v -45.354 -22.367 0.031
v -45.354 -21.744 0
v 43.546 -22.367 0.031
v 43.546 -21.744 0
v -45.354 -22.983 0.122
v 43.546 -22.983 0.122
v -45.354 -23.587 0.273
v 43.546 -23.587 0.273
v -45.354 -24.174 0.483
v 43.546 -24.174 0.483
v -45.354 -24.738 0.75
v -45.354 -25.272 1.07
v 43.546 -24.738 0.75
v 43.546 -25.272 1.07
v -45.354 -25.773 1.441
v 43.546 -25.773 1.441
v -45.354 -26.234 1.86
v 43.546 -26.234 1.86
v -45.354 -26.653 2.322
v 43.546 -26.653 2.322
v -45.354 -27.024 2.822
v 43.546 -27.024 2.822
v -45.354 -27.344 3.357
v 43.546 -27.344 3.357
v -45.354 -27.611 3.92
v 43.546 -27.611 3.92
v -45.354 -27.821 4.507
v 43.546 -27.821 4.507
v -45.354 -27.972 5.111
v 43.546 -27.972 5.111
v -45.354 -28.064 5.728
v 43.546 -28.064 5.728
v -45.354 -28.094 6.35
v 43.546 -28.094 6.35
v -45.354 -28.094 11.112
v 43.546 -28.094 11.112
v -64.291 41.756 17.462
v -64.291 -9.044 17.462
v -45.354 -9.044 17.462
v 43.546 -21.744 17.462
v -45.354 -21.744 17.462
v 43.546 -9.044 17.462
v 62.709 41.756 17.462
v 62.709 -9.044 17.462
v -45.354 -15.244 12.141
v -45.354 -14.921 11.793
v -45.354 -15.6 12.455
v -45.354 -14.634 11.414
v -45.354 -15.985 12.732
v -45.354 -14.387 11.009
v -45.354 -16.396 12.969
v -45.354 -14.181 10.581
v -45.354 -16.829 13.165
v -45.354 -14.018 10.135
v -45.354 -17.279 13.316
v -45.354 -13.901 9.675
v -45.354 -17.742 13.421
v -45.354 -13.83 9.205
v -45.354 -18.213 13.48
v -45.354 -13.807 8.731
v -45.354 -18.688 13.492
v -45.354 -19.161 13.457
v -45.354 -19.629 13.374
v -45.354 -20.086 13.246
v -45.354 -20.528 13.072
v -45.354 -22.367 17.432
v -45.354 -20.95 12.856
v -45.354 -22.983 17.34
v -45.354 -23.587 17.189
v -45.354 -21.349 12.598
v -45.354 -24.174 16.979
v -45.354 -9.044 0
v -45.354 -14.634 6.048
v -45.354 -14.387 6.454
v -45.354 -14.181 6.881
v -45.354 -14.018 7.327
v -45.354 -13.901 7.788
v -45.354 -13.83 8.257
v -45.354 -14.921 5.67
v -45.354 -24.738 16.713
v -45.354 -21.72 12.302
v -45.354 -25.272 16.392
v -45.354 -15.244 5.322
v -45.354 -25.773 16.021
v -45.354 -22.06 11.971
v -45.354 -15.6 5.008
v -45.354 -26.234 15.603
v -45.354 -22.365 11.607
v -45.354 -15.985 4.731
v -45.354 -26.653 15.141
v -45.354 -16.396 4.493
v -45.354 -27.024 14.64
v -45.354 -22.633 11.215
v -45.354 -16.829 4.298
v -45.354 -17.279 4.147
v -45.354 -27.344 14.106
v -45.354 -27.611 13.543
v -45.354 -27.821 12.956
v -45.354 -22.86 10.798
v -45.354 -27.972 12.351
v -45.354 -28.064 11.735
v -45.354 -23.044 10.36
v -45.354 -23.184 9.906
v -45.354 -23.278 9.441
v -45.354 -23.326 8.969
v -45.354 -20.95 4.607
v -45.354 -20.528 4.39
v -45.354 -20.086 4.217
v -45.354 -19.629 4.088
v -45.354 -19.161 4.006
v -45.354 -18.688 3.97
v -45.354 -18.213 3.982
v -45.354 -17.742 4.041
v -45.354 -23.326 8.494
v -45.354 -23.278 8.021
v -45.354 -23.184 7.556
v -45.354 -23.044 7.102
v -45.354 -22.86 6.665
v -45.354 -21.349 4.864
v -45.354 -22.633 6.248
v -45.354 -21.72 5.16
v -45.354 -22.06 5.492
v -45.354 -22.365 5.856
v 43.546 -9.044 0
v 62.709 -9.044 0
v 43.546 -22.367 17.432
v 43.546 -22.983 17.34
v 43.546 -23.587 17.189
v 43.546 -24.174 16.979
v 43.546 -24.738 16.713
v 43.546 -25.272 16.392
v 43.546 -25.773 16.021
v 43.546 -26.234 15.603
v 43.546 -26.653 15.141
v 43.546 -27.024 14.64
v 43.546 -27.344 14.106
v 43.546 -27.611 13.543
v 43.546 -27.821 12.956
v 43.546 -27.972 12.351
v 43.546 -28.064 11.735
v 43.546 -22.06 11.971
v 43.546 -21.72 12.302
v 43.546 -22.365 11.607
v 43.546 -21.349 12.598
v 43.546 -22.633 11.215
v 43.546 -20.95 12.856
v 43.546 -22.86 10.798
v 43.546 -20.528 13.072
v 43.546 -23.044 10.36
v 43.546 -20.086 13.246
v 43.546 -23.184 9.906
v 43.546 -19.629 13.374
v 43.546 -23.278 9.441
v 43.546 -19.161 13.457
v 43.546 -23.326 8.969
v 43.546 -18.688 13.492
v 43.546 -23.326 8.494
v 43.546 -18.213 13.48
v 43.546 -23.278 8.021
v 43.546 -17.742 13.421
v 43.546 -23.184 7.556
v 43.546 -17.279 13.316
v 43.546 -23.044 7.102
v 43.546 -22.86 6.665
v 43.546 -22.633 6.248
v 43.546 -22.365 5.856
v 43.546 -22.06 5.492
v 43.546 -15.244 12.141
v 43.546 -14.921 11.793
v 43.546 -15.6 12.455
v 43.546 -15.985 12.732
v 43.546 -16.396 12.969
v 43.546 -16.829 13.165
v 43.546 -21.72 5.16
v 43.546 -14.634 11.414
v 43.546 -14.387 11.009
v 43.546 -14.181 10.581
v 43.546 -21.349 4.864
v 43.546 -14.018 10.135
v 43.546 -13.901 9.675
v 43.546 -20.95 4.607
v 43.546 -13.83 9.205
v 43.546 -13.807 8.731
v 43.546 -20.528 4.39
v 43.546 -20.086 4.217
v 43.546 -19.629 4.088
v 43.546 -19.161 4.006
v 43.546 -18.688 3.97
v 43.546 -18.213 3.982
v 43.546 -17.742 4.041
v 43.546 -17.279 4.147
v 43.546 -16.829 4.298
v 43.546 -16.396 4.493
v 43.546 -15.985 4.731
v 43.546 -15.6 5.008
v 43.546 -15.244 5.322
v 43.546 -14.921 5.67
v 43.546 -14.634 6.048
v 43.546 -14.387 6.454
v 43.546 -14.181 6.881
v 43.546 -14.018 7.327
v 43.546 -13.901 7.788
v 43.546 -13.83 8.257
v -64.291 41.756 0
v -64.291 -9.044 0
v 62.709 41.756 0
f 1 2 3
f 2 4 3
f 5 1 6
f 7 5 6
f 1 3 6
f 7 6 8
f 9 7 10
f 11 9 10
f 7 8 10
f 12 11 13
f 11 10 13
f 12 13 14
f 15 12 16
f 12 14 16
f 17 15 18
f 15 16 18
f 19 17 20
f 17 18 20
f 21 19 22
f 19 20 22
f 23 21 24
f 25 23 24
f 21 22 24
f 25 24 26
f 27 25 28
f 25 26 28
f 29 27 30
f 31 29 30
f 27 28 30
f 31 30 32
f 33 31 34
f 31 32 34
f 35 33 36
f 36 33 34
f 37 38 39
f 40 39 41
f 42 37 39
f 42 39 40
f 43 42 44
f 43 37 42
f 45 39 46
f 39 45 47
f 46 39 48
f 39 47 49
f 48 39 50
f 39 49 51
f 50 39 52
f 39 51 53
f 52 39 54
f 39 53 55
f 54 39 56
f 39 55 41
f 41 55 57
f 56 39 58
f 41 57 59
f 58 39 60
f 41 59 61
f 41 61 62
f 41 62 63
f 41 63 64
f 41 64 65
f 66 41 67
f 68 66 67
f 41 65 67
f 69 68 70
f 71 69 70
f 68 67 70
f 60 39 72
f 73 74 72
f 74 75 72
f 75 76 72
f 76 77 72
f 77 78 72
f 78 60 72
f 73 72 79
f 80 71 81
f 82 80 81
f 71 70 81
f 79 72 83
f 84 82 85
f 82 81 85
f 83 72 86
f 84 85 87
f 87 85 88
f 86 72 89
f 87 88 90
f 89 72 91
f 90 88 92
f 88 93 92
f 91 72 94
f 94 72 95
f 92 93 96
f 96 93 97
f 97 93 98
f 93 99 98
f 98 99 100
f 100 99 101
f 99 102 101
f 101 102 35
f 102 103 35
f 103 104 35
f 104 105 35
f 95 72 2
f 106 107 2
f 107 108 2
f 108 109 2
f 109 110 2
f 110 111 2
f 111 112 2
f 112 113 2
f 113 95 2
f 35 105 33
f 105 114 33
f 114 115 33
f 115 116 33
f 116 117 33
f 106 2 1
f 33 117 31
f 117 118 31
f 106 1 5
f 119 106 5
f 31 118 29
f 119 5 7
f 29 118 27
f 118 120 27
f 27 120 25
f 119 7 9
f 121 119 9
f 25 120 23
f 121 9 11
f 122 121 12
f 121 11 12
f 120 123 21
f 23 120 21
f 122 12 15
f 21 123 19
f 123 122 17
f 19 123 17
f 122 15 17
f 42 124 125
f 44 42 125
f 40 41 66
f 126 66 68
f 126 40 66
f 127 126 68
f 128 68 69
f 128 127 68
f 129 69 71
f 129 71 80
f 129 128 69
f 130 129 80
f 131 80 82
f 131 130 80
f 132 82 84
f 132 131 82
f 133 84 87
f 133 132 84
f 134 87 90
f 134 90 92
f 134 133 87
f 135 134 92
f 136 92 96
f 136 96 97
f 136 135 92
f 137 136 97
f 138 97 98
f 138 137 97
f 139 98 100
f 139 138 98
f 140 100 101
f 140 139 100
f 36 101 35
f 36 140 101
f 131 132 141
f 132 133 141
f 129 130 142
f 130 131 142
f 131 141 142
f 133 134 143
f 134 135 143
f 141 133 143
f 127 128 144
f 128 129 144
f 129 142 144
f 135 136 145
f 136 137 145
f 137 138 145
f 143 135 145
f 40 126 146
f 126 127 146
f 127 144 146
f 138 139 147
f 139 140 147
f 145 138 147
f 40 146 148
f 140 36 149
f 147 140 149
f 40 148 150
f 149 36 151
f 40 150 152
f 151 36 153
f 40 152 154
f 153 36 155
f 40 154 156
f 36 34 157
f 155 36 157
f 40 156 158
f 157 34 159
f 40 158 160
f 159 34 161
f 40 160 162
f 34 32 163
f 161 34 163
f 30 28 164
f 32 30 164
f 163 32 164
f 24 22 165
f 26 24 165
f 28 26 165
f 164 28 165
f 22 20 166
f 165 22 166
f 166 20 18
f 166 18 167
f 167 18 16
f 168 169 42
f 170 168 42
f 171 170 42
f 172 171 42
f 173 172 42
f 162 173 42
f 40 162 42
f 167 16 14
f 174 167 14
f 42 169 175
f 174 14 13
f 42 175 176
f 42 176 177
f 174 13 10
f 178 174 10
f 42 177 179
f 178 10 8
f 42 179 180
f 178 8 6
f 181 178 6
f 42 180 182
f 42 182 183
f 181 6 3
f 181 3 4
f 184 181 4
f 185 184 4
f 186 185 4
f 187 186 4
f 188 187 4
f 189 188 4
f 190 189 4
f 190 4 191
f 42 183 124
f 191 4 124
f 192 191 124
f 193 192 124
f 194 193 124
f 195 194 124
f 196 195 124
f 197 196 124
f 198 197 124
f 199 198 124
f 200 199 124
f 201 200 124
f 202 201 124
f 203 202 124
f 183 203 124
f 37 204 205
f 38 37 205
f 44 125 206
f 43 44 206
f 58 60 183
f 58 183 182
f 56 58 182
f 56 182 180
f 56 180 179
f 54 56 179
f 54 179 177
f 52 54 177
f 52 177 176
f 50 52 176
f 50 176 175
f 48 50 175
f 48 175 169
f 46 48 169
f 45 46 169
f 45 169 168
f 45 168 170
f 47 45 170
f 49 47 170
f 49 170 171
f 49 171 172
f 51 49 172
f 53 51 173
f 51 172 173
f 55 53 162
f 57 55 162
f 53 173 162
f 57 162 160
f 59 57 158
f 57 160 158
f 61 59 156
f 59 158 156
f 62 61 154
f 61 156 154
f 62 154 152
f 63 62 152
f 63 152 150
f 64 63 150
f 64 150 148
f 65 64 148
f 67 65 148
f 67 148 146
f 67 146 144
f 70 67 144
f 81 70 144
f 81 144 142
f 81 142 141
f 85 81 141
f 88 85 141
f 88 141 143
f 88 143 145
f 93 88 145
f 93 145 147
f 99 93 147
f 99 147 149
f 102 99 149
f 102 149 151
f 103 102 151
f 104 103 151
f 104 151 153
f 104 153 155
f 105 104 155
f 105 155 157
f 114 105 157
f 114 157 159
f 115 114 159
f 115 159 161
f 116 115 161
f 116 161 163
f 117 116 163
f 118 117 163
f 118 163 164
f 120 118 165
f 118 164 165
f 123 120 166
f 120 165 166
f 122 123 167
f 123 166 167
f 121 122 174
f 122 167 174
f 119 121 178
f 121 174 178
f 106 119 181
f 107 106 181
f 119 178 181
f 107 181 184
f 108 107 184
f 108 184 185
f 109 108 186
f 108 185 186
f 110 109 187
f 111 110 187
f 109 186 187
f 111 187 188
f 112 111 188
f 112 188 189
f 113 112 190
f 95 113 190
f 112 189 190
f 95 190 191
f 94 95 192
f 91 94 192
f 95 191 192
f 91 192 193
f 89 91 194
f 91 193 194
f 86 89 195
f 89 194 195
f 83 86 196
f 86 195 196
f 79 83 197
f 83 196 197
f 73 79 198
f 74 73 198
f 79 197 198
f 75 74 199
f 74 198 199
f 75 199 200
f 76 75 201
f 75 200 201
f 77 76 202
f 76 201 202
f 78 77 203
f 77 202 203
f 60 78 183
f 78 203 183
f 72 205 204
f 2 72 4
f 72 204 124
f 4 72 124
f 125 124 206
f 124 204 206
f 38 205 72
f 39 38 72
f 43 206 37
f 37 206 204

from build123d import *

# Parameters (mm, degrees)
F1_DEPTH = 17.4625
F3_D     = 9.525
F4_R     = 6.35


with BuildPart() as f1:
    # F0 (on Top) → F1 (new body)
    with BuildSketch(Plane.XY):
        Polygon((62.708709, 41.755856), (-64.291291, 41.755856), (-64.291291, -9.044144), (-45.354009, -9.044144), (-45.354009, -28.094144), (43.545991, -28.094144), (43.545991, -9.044144), (62.708709, -9.044144), align=None)
    extrude(amount=F1_DEPTH)

    # F3 (through all)
    with Locations(Plane(origin=(-45.354009, 0, 0), x_dir=(0, -1, 0), z_dir=(-1, 0, 0))):
        with Locations((18.569144, 8.73125)):
            Hole(F3_D / 2)

    # F4
    f4_edges = [f1.edges().sort_by_distance(p)[0] for p in [
        (-0.904009, -28.094144, 17.4625),
        (-0.904009, -28.094144, 0),
    ]]
    fillet(f4_edges, radius=F4_R)


solid = f1.part
